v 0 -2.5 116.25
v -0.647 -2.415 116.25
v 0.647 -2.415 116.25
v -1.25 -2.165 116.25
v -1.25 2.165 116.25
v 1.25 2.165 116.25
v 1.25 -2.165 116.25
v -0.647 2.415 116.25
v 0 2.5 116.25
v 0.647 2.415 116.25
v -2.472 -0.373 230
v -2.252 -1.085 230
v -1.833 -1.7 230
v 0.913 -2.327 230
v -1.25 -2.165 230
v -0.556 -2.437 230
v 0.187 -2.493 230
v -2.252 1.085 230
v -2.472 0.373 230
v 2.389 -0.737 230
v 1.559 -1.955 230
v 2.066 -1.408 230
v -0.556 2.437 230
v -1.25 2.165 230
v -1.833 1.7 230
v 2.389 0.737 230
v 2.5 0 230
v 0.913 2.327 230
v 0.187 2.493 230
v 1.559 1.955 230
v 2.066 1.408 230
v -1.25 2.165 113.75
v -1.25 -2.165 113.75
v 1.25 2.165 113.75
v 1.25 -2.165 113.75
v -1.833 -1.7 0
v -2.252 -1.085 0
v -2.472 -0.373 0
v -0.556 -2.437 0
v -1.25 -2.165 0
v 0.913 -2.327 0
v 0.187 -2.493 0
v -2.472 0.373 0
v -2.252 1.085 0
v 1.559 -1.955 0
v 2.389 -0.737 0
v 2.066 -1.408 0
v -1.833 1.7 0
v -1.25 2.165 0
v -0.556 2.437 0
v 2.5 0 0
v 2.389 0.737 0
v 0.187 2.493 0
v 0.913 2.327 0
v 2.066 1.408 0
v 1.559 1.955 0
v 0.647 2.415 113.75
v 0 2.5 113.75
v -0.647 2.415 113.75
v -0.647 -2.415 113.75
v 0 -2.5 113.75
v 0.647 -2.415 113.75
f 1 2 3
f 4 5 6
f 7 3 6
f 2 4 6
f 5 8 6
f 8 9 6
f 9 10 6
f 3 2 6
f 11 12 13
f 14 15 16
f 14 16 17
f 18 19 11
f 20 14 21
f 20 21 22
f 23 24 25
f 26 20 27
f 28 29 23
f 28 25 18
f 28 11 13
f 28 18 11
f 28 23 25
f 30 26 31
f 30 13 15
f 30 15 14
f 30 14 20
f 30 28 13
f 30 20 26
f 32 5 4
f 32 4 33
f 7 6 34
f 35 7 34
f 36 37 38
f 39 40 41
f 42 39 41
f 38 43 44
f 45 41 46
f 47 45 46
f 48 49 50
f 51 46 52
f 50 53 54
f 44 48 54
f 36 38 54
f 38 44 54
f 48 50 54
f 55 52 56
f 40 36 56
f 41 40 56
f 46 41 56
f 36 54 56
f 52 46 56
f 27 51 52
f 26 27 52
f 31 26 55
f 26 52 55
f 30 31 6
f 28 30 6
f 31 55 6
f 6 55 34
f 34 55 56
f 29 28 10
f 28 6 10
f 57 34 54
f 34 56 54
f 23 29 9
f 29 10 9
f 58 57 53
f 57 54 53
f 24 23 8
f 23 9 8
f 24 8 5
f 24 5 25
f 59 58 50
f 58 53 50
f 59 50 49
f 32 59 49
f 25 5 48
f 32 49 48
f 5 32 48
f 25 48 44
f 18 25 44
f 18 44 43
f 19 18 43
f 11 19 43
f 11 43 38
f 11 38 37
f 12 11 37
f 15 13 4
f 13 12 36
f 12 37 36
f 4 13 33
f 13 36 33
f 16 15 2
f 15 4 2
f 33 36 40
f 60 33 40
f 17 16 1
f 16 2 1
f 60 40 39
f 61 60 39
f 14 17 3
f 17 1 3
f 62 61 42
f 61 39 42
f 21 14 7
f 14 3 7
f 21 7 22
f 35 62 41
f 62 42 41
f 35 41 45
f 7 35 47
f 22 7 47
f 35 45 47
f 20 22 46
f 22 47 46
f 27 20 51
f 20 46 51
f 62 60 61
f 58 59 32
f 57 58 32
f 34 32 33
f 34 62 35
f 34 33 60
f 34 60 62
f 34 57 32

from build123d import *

# Parameters (mm, degrees)
CROQUIS1_R              = 2.5
SALIENTE_EXTRUIR1_DEPTH = 230
CROQUIS2_W              = 2.5
CROQUIS2_H              = 2.5
CORTAR_EXTRUIR1_DEPTH   = 5


with BuildPart() as part:
    # Croquis1 → Saliente-Extruir1 (new body)
    with BuildSketch(Plane.XY):
        Circle(CROQUIS1_R)
    extrude(amount=SALIENTE_EXTRUIR1_DEPTH)

    # Croquis2 → Cortar-Extruir1 (cut, symmetric)
    with BuildSketch(Plane(origin=(0, 0, 0), x_dir=(1, 0, 0), z_dir=(0, 1, 0))):
        with Locations((0, -115)):
            Rectangle(CROQUIS2_W, CROQUIS2_H)
    extrude(amount=CORTAR_EXTRUIR1_DEPTH, both=True, mode=Mode.SUBTRACT)


solid = part.part
